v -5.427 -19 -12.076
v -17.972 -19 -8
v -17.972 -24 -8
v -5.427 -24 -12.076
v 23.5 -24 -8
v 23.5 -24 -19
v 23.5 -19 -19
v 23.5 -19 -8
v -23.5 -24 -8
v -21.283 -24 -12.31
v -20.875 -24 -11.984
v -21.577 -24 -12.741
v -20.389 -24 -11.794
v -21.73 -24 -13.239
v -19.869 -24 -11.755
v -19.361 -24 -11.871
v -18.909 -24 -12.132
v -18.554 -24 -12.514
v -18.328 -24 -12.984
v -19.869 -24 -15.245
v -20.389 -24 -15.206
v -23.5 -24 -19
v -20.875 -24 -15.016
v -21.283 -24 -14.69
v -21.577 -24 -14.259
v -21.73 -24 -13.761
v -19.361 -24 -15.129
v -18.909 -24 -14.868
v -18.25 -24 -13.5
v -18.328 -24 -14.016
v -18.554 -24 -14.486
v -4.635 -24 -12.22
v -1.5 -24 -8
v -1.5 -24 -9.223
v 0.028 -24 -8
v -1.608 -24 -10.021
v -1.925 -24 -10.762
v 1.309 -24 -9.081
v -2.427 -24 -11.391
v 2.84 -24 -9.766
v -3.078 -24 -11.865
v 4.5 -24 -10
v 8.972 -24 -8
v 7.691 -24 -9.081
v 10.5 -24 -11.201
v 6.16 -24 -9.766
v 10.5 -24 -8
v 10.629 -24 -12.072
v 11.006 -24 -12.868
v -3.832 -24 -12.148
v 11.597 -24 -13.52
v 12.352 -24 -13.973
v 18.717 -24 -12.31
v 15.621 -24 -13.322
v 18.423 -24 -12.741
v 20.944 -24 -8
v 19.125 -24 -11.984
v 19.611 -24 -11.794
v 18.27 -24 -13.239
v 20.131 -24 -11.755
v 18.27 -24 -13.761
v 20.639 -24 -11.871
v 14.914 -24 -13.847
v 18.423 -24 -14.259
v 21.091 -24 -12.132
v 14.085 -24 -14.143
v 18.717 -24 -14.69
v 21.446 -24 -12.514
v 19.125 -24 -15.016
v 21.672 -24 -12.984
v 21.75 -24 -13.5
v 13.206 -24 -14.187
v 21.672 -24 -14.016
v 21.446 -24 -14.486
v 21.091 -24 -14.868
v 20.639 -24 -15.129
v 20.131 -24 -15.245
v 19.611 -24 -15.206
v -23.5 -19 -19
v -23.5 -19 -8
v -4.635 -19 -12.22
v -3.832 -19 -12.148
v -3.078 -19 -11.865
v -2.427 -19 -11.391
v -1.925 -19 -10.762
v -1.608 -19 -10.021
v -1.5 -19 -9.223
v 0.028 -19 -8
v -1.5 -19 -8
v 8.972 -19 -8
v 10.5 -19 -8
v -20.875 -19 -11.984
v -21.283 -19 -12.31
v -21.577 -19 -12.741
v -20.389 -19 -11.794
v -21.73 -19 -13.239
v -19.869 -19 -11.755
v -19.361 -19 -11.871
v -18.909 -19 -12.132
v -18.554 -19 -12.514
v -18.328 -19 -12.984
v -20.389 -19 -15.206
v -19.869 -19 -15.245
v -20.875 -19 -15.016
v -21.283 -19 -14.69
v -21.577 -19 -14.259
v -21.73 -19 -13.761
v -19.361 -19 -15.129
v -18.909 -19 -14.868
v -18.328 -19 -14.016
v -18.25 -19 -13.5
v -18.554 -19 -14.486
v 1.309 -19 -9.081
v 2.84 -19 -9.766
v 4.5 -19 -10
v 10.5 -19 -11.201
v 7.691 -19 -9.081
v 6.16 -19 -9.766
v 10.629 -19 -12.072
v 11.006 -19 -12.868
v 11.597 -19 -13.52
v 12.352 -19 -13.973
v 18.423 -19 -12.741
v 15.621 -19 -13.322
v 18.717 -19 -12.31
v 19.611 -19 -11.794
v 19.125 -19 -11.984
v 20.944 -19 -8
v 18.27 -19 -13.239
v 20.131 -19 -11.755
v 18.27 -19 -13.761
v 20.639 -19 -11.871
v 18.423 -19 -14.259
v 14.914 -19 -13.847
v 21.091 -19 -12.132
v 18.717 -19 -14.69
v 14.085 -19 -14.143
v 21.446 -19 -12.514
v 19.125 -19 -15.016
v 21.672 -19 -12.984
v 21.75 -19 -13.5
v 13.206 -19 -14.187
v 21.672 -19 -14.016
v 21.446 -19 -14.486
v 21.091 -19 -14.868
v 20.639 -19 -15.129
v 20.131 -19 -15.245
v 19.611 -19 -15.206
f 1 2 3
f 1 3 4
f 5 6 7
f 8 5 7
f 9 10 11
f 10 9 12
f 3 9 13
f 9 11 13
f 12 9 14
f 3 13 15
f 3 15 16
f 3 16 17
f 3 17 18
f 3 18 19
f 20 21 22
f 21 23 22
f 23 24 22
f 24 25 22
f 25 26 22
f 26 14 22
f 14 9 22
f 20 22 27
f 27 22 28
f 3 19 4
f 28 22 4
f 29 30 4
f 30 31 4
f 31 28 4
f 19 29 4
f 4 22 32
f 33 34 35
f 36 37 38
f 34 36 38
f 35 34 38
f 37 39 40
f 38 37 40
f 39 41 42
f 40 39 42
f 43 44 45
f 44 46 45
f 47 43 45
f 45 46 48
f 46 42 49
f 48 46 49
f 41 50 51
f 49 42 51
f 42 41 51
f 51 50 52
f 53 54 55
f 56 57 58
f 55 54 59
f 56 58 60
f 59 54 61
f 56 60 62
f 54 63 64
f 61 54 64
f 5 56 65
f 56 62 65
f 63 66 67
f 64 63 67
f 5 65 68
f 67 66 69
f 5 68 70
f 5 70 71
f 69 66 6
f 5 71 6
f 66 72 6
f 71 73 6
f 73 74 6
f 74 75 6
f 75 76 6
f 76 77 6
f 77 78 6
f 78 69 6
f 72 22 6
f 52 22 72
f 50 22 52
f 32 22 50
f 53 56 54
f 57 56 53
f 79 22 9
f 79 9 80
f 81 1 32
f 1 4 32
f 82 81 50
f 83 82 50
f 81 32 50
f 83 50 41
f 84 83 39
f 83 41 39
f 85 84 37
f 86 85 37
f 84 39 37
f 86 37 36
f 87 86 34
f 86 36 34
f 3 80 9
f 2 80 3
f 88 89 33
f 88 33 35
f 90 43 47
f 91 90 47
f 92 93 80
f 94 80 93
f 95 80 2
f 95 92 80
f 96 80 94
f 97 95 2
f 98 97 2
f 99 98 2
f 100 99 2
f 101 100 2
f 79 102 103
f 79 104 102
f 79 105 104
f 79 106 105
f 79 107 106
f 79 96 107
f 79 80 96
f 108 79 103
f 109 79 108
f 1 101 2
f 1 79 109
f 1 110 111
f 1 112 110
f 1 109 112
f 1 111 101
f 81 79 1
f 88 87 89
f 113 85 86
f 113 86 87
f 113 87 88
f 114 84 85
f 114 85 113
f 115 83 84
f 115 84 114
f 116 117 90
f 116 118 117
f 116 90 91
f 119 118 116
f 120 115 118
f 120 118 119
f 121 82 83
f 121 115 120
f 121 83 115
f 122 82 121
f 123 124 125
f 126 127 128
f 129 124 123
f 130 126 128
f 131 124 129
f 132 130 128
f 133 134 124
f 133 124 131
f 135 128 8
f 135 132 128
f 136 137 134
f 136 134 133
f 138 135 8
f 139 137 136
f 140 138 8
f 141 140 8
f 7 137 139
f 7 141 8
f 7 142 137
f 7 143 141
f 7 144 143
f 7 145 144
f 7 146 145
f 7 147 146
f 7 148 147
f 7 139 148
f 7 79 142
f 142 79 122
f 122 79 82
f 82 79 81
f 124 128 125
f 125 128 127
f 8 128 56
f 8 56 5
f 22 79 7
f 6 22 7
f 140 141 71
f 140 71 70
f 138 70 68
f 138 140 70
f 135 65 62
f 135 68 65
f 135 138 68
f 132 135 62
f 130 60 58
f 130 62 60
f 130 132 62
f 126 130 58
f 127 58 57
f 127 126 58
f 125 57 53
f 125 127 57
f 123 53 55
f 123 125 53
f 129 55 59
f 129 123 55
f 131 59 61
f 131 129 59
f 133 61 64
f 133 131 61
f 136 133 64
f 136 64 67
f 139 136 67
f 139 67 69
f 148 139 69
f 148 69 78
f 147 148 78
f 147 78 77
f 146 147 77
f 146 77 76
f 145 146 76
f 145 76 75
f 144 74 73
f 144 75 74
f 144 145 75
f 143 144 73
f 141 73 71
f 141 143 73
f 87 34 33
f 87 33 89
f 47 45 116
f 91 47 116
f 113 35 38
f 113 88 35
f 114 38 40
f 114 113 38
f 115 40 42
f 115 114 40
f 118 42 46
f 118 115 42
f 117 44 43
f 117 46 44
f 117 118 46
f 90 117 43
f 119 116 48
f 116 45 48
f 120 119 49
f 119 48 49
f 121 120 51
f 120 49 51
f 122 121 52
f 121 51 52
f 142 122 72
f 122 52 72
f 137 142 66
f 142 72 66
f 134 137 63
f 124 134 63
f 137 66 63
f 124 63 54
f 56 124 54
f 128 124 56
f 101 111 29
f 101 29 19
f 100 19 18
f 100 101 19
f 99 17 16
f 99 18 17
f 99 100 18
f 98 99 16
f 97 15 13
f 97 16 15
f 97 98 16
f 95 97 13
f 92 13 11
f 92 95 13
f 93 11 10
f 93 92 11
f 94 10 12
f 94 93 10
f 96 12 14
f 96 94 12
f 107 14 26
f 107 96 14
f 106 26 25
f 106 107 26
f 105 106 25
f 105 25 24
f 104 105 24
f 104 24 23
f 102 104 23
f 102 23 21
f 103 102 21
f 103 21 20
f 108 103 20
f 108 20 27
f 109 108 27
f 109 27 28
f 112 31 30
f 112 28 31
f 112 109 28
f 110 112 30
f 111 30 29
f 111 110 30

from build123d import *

# Parameters (mm, degrees)
CYLINDER035_R          = 1.75
CYLINDER035_DEPTH      = 44
CYLINDER035_ROLL_ANGLE = 90
CYLINDER034_R          = 1.75
CYLINDER034_DEPTH      = 44
CYLINDER034_ROLL_ANGLE = 90
CYLINDER037_R          = 6
CYLINDER037_DEPTH      = 34
CYLINDER037_ROLL_ANGLE = 90
CYLINDER024_R          = 1.75
CYLINDER024_DEPTH      = 44
CYLINDER024_ROLL_ANGLE = 90
BOX054_W               = 37
BOX054_H               = 5
BOX054_DEPTH           = 14
BOX054_PITCH_ANGLE     = 18
BOX055_W               = 22
BOX055_H               = 5
BOX055_DEPTH           = 11
BOX055_PITCH_ANGLE     = -45
BOX056_W               = 12
BOX056_H               = 5
BOX056_DEPTH           = 31
CYLINDER025_R          = 1.75
CYLINDER025_DEPTH      = 44
CYLINDER025_ROLL_ANGLE = 90
BOX053_W               = 47
BOX053_H               = 5
BOX053_DEPTH           = 27
FILLET_R               = 3
BOX057_W               = 47
BOX057_H               = 5
BOX057_DEPTH           = 11


with BuildPart() as cylinder_for_hole_4_motherboard002:
    # Cylinder035 → Cylinder035 (new body)
    with BuildSketch(Plane.XY):
        Circle(CYLINDER035_R)
    extrude(amount=CYLINDER035_DEPTH)


with BuildPart() as cylinder_for_hole_4_motherboard002_1:
    # Cylinder035 roll: moved
    add(cylinder_for_hole_4_motherboard002.part.rotate(Axis((0, 0, 0), (1, 0, 0)), CYLINDER035_ROLL_ANGLE))


with BuildPart() as cylinder_for_hole_4_motherboard002_2:
    # Cylinder035 placement: moved
    add(cylinder_for_hole_4_motherboard002_1.part.moved(Location((20, 6, -13.5))))


with BuildPart() as cylinder_for_hole_3_motherboard002:
    # Cylinder034 → Cylinder034 (new body)
    with BuildSketch(Plane.XY):
        Circle(CYLINDER034_R)
    extrude(amount=CYLINDER034_DEPTH)


with BuildPart() as cylinder_for_hole_3_motherboard002_1:
    # Cylinder034 roll: moved
    add(cylinder_for_hole_3_motherboard002.part.rotate(Axis((0, 0, 0), (1, 0, 0)), CYLINDER034_ROLL_ANGLE))


with BuildPart() as cylinder_for_hole_3_motherboard002_2:
    # Cylinder034 placement: moved
    add(cylinder_for_hole_3_motherboard002_1.part.moved(Location((-20, 6, -13.5))))


with BuildPart() as jhead_hole:
    # Cylinder037 → Cylinder037 (new body)
    with BuildSketch(Plane.XY):
        Circle(CYLINDER037_R)
    extrude(amount=CYLINDER037_DEPTH)


with BuildPart() as jhead_hole_1:
    # Cylinder037 roll: moved
    add(jhead_hole.part.rotate(Axis((0, 0, 0), (1, 0, 0)), CYLINDER037_ROLL_ANGLE))


with BuildPart() as jhead_hole_2:
    # Cylinder037 placement: moved
    add(jhead_hole_1.part.moved(Location((4.5, 0, -4))))


with BuildPart() as jhead_lock_plate_holes:
    # Fusion016 base: copy of jhead hole
    add(jhead_hole_2.part)

    # Fusion016: union cylinder for hole 4 - Motherboard002, cylinder for hole 3 - Motherboard002
    add(cylinder_for_hole_4_motherboard002_2.part)
    add(cylinder_for_hole_3_motherboard002_2.part)


with BuildPart() as cylinder_for_hole_9_groovemount_l001:
    # Cylinder024 → Cylinder024 (new body)
    with BuildSketch(Plane.XY):
        Circle(CYLINDER024_R)
    extrude(amount=CYLINDER024_DEPTH)


with BuildPart() as cylinder_for_hole_9_groovemount_l001_1:
    # Cylinder024 roll: moved
    add(cylinder_for_hole_9_groovemount_l001.part.rotate(Axis((0, 0, 0), (1, 0, 0)), CYLINDER024_ROLL_ANGLE))


with BuildPart() as cylinder_for_hole_9_groovemount_l001_2:
    # Cylinder024 placement: moved
    add(cylinder_for_hole_9_groovemount_l001_1.part.moved(Location((-20, 6, -2.5))))


with BuildPart() as jhead_retention_plate_chamfer_l:
    # Box054 → Box054 (new body)
    with BuildSketch(Plane.XY):
        with Locations((18.5, 2.5)):
            Rectangle(BOX054_W, BOX054_H)
    extrude(amount=BOX054_DEPTH)


with BuildPart() as jhead_retention_plate_chamfer_l_1:
    # Box054 pitch: moved
    add(jhead_retention_plate_chamfer_l.part.rotate(Axis((0, 0, 0), (0, 1, 0)), BOX054_PITCH_ANGLE))


with BuildPart() as jhead_retention_plate_chamfer_l_2:
    # Box054 placement: moved
    add(jhead_retention_plate_chamfer_l_1.part.moved(Location((-32.5, -24, -17))))


with BuildPart() as jhead_retention_plate_chamfer_r:
    # Box055 → Box055 (new body)
    with BuildSketch(Plane.XY):
        with Locations((11, 2.5)):
            Rectangle(BOX055_W, BOX055_H)
    extrude(amount=BOX055_DEPTH)


with BuildPart() as jhead_retention_plate_chamfer_r_1:
    # Box055 pitch: moved
    add(jhead_retention_plate_chamfer_r.part.rotate(Axis((0, 0, 0), (0, 1, 0)), BOX055_PITCH_ANGLE))


with BuildPart() as jhead_retention_plate_chamfer_r_2:
    # Box055 placement: moved
    add(jhead_retention_plate_chamfer_r_1.part.moved(Location((16.5, -24, -27))))


with BuildPart() as jhead_retention_plate_slide_in_hole:
    # Box056 → Box056 (new body)
    with BuildSketch(Plane(origin=(-1.5, -24, -35), x_dir=(1, 0, 0), z_dir=(0, 0, 1))):
        with Locations((6, 2.5)):
            Rectangle(BOX056_W, BOX056_H)
    extrude(amount=BOX056_DEPTH)


with BuildPart() as jhead_retention_plate_holes:
    # Cylinder025 → Cylinder025 (new body)
    with BuildSketch(Plane.XY):
        Circle(CYLINDER025_R)
    extrude(amount=CYLINDER025_DEPTH)


with BuildPart() as jhead_retention_plate_holes_1:
    # Cylinder025 roll: moved
    add(jhead_retention_plate_holes.part.rotate(Axis((0, 0, 0), (1, 0, 0)), CYLINDER025_ROLL_ANGLE))


with BuildPart() as jhead_retention_plate_holes_2:
    # Cylinder025 placement: moved
    add(jhead_retention_plate_holes_1.part.moved(Location((20, 6, -2.5))))

    # Fusion015: union cylinder for hole 9 - Groovemount L001, jhead hole, jhead retention plate chamfer L, jhead retention plate chamfer R, jhead retention plate slide in hole
    add(cylinder_for_hole_9_groovemount_l001_2.part)
    add(jhead_hole_2.part)
    add(jhead_retention_plate_chamfer_l_2.part)
    add(jhead_retention_plate_chamfer_r_2.part)
    add(jhead_retention_plate_slide_in_hole.part)


with BuildPart() as fillet_body:
    # Box053 → Box053 (new body)
    with BuildSketch(Plane(origin=(-23.5, -24, -19), x_dir=(1, 0, 0), z_dir=(0, 0, 1))):
        with Locations((23.5, 2.5)):
            Rectangle(BOX053_W, BOX053_H)
    extrude(amount=BOX053_DEPTH)

    # Cut009: cut jhead retention plate holes
    add(jhead_retention_plate_holes_2.part, mode=Mode.SUBTRACT)

    # Fillet
    fillet_edges = [fillet_body.edges().sort_by_distance(p)[0] for p in [
        (-23.5, -21.5, 8),
        (-23.5, -21.5, -5.203806),
        (23.5, -21.5, 8),
        (-1.5, -21.5, -12.352039),
        (10.5, -21.5, -17.443651),
        (23.5, -21.5, -4.443651),
    ]]
    fillet(fillet_edges, radius=FILLET_R)


with BuildPart() as cut011:
    # Box057 → Box057 (new body)
    with BuildSketch(Plane(origin=(-23.5, -24, -18), x_dir=(1, 0, 0), z_dir=(0, 0, 1))):
        with Locations((23.5, 2.5)):
            Rectangle(BOX057_W, BOX057_H)
    extrude(amount=BOX057_DEPTH)

    # Cut010: cut Fillet body
    add(fillet_body.part, mode=Mode.SUBTRACT)


with BuildPart() as cut011_1:
    # Cut010 placement: moved
    add(cut011.part.moved(Location((0, 0, -1))))

    # Cut011: cut jhead lock plate holes
    add(jhead_lock_plate_holes.part, mode=Mode.SUBTRACT)


solid = cut011_1.part
